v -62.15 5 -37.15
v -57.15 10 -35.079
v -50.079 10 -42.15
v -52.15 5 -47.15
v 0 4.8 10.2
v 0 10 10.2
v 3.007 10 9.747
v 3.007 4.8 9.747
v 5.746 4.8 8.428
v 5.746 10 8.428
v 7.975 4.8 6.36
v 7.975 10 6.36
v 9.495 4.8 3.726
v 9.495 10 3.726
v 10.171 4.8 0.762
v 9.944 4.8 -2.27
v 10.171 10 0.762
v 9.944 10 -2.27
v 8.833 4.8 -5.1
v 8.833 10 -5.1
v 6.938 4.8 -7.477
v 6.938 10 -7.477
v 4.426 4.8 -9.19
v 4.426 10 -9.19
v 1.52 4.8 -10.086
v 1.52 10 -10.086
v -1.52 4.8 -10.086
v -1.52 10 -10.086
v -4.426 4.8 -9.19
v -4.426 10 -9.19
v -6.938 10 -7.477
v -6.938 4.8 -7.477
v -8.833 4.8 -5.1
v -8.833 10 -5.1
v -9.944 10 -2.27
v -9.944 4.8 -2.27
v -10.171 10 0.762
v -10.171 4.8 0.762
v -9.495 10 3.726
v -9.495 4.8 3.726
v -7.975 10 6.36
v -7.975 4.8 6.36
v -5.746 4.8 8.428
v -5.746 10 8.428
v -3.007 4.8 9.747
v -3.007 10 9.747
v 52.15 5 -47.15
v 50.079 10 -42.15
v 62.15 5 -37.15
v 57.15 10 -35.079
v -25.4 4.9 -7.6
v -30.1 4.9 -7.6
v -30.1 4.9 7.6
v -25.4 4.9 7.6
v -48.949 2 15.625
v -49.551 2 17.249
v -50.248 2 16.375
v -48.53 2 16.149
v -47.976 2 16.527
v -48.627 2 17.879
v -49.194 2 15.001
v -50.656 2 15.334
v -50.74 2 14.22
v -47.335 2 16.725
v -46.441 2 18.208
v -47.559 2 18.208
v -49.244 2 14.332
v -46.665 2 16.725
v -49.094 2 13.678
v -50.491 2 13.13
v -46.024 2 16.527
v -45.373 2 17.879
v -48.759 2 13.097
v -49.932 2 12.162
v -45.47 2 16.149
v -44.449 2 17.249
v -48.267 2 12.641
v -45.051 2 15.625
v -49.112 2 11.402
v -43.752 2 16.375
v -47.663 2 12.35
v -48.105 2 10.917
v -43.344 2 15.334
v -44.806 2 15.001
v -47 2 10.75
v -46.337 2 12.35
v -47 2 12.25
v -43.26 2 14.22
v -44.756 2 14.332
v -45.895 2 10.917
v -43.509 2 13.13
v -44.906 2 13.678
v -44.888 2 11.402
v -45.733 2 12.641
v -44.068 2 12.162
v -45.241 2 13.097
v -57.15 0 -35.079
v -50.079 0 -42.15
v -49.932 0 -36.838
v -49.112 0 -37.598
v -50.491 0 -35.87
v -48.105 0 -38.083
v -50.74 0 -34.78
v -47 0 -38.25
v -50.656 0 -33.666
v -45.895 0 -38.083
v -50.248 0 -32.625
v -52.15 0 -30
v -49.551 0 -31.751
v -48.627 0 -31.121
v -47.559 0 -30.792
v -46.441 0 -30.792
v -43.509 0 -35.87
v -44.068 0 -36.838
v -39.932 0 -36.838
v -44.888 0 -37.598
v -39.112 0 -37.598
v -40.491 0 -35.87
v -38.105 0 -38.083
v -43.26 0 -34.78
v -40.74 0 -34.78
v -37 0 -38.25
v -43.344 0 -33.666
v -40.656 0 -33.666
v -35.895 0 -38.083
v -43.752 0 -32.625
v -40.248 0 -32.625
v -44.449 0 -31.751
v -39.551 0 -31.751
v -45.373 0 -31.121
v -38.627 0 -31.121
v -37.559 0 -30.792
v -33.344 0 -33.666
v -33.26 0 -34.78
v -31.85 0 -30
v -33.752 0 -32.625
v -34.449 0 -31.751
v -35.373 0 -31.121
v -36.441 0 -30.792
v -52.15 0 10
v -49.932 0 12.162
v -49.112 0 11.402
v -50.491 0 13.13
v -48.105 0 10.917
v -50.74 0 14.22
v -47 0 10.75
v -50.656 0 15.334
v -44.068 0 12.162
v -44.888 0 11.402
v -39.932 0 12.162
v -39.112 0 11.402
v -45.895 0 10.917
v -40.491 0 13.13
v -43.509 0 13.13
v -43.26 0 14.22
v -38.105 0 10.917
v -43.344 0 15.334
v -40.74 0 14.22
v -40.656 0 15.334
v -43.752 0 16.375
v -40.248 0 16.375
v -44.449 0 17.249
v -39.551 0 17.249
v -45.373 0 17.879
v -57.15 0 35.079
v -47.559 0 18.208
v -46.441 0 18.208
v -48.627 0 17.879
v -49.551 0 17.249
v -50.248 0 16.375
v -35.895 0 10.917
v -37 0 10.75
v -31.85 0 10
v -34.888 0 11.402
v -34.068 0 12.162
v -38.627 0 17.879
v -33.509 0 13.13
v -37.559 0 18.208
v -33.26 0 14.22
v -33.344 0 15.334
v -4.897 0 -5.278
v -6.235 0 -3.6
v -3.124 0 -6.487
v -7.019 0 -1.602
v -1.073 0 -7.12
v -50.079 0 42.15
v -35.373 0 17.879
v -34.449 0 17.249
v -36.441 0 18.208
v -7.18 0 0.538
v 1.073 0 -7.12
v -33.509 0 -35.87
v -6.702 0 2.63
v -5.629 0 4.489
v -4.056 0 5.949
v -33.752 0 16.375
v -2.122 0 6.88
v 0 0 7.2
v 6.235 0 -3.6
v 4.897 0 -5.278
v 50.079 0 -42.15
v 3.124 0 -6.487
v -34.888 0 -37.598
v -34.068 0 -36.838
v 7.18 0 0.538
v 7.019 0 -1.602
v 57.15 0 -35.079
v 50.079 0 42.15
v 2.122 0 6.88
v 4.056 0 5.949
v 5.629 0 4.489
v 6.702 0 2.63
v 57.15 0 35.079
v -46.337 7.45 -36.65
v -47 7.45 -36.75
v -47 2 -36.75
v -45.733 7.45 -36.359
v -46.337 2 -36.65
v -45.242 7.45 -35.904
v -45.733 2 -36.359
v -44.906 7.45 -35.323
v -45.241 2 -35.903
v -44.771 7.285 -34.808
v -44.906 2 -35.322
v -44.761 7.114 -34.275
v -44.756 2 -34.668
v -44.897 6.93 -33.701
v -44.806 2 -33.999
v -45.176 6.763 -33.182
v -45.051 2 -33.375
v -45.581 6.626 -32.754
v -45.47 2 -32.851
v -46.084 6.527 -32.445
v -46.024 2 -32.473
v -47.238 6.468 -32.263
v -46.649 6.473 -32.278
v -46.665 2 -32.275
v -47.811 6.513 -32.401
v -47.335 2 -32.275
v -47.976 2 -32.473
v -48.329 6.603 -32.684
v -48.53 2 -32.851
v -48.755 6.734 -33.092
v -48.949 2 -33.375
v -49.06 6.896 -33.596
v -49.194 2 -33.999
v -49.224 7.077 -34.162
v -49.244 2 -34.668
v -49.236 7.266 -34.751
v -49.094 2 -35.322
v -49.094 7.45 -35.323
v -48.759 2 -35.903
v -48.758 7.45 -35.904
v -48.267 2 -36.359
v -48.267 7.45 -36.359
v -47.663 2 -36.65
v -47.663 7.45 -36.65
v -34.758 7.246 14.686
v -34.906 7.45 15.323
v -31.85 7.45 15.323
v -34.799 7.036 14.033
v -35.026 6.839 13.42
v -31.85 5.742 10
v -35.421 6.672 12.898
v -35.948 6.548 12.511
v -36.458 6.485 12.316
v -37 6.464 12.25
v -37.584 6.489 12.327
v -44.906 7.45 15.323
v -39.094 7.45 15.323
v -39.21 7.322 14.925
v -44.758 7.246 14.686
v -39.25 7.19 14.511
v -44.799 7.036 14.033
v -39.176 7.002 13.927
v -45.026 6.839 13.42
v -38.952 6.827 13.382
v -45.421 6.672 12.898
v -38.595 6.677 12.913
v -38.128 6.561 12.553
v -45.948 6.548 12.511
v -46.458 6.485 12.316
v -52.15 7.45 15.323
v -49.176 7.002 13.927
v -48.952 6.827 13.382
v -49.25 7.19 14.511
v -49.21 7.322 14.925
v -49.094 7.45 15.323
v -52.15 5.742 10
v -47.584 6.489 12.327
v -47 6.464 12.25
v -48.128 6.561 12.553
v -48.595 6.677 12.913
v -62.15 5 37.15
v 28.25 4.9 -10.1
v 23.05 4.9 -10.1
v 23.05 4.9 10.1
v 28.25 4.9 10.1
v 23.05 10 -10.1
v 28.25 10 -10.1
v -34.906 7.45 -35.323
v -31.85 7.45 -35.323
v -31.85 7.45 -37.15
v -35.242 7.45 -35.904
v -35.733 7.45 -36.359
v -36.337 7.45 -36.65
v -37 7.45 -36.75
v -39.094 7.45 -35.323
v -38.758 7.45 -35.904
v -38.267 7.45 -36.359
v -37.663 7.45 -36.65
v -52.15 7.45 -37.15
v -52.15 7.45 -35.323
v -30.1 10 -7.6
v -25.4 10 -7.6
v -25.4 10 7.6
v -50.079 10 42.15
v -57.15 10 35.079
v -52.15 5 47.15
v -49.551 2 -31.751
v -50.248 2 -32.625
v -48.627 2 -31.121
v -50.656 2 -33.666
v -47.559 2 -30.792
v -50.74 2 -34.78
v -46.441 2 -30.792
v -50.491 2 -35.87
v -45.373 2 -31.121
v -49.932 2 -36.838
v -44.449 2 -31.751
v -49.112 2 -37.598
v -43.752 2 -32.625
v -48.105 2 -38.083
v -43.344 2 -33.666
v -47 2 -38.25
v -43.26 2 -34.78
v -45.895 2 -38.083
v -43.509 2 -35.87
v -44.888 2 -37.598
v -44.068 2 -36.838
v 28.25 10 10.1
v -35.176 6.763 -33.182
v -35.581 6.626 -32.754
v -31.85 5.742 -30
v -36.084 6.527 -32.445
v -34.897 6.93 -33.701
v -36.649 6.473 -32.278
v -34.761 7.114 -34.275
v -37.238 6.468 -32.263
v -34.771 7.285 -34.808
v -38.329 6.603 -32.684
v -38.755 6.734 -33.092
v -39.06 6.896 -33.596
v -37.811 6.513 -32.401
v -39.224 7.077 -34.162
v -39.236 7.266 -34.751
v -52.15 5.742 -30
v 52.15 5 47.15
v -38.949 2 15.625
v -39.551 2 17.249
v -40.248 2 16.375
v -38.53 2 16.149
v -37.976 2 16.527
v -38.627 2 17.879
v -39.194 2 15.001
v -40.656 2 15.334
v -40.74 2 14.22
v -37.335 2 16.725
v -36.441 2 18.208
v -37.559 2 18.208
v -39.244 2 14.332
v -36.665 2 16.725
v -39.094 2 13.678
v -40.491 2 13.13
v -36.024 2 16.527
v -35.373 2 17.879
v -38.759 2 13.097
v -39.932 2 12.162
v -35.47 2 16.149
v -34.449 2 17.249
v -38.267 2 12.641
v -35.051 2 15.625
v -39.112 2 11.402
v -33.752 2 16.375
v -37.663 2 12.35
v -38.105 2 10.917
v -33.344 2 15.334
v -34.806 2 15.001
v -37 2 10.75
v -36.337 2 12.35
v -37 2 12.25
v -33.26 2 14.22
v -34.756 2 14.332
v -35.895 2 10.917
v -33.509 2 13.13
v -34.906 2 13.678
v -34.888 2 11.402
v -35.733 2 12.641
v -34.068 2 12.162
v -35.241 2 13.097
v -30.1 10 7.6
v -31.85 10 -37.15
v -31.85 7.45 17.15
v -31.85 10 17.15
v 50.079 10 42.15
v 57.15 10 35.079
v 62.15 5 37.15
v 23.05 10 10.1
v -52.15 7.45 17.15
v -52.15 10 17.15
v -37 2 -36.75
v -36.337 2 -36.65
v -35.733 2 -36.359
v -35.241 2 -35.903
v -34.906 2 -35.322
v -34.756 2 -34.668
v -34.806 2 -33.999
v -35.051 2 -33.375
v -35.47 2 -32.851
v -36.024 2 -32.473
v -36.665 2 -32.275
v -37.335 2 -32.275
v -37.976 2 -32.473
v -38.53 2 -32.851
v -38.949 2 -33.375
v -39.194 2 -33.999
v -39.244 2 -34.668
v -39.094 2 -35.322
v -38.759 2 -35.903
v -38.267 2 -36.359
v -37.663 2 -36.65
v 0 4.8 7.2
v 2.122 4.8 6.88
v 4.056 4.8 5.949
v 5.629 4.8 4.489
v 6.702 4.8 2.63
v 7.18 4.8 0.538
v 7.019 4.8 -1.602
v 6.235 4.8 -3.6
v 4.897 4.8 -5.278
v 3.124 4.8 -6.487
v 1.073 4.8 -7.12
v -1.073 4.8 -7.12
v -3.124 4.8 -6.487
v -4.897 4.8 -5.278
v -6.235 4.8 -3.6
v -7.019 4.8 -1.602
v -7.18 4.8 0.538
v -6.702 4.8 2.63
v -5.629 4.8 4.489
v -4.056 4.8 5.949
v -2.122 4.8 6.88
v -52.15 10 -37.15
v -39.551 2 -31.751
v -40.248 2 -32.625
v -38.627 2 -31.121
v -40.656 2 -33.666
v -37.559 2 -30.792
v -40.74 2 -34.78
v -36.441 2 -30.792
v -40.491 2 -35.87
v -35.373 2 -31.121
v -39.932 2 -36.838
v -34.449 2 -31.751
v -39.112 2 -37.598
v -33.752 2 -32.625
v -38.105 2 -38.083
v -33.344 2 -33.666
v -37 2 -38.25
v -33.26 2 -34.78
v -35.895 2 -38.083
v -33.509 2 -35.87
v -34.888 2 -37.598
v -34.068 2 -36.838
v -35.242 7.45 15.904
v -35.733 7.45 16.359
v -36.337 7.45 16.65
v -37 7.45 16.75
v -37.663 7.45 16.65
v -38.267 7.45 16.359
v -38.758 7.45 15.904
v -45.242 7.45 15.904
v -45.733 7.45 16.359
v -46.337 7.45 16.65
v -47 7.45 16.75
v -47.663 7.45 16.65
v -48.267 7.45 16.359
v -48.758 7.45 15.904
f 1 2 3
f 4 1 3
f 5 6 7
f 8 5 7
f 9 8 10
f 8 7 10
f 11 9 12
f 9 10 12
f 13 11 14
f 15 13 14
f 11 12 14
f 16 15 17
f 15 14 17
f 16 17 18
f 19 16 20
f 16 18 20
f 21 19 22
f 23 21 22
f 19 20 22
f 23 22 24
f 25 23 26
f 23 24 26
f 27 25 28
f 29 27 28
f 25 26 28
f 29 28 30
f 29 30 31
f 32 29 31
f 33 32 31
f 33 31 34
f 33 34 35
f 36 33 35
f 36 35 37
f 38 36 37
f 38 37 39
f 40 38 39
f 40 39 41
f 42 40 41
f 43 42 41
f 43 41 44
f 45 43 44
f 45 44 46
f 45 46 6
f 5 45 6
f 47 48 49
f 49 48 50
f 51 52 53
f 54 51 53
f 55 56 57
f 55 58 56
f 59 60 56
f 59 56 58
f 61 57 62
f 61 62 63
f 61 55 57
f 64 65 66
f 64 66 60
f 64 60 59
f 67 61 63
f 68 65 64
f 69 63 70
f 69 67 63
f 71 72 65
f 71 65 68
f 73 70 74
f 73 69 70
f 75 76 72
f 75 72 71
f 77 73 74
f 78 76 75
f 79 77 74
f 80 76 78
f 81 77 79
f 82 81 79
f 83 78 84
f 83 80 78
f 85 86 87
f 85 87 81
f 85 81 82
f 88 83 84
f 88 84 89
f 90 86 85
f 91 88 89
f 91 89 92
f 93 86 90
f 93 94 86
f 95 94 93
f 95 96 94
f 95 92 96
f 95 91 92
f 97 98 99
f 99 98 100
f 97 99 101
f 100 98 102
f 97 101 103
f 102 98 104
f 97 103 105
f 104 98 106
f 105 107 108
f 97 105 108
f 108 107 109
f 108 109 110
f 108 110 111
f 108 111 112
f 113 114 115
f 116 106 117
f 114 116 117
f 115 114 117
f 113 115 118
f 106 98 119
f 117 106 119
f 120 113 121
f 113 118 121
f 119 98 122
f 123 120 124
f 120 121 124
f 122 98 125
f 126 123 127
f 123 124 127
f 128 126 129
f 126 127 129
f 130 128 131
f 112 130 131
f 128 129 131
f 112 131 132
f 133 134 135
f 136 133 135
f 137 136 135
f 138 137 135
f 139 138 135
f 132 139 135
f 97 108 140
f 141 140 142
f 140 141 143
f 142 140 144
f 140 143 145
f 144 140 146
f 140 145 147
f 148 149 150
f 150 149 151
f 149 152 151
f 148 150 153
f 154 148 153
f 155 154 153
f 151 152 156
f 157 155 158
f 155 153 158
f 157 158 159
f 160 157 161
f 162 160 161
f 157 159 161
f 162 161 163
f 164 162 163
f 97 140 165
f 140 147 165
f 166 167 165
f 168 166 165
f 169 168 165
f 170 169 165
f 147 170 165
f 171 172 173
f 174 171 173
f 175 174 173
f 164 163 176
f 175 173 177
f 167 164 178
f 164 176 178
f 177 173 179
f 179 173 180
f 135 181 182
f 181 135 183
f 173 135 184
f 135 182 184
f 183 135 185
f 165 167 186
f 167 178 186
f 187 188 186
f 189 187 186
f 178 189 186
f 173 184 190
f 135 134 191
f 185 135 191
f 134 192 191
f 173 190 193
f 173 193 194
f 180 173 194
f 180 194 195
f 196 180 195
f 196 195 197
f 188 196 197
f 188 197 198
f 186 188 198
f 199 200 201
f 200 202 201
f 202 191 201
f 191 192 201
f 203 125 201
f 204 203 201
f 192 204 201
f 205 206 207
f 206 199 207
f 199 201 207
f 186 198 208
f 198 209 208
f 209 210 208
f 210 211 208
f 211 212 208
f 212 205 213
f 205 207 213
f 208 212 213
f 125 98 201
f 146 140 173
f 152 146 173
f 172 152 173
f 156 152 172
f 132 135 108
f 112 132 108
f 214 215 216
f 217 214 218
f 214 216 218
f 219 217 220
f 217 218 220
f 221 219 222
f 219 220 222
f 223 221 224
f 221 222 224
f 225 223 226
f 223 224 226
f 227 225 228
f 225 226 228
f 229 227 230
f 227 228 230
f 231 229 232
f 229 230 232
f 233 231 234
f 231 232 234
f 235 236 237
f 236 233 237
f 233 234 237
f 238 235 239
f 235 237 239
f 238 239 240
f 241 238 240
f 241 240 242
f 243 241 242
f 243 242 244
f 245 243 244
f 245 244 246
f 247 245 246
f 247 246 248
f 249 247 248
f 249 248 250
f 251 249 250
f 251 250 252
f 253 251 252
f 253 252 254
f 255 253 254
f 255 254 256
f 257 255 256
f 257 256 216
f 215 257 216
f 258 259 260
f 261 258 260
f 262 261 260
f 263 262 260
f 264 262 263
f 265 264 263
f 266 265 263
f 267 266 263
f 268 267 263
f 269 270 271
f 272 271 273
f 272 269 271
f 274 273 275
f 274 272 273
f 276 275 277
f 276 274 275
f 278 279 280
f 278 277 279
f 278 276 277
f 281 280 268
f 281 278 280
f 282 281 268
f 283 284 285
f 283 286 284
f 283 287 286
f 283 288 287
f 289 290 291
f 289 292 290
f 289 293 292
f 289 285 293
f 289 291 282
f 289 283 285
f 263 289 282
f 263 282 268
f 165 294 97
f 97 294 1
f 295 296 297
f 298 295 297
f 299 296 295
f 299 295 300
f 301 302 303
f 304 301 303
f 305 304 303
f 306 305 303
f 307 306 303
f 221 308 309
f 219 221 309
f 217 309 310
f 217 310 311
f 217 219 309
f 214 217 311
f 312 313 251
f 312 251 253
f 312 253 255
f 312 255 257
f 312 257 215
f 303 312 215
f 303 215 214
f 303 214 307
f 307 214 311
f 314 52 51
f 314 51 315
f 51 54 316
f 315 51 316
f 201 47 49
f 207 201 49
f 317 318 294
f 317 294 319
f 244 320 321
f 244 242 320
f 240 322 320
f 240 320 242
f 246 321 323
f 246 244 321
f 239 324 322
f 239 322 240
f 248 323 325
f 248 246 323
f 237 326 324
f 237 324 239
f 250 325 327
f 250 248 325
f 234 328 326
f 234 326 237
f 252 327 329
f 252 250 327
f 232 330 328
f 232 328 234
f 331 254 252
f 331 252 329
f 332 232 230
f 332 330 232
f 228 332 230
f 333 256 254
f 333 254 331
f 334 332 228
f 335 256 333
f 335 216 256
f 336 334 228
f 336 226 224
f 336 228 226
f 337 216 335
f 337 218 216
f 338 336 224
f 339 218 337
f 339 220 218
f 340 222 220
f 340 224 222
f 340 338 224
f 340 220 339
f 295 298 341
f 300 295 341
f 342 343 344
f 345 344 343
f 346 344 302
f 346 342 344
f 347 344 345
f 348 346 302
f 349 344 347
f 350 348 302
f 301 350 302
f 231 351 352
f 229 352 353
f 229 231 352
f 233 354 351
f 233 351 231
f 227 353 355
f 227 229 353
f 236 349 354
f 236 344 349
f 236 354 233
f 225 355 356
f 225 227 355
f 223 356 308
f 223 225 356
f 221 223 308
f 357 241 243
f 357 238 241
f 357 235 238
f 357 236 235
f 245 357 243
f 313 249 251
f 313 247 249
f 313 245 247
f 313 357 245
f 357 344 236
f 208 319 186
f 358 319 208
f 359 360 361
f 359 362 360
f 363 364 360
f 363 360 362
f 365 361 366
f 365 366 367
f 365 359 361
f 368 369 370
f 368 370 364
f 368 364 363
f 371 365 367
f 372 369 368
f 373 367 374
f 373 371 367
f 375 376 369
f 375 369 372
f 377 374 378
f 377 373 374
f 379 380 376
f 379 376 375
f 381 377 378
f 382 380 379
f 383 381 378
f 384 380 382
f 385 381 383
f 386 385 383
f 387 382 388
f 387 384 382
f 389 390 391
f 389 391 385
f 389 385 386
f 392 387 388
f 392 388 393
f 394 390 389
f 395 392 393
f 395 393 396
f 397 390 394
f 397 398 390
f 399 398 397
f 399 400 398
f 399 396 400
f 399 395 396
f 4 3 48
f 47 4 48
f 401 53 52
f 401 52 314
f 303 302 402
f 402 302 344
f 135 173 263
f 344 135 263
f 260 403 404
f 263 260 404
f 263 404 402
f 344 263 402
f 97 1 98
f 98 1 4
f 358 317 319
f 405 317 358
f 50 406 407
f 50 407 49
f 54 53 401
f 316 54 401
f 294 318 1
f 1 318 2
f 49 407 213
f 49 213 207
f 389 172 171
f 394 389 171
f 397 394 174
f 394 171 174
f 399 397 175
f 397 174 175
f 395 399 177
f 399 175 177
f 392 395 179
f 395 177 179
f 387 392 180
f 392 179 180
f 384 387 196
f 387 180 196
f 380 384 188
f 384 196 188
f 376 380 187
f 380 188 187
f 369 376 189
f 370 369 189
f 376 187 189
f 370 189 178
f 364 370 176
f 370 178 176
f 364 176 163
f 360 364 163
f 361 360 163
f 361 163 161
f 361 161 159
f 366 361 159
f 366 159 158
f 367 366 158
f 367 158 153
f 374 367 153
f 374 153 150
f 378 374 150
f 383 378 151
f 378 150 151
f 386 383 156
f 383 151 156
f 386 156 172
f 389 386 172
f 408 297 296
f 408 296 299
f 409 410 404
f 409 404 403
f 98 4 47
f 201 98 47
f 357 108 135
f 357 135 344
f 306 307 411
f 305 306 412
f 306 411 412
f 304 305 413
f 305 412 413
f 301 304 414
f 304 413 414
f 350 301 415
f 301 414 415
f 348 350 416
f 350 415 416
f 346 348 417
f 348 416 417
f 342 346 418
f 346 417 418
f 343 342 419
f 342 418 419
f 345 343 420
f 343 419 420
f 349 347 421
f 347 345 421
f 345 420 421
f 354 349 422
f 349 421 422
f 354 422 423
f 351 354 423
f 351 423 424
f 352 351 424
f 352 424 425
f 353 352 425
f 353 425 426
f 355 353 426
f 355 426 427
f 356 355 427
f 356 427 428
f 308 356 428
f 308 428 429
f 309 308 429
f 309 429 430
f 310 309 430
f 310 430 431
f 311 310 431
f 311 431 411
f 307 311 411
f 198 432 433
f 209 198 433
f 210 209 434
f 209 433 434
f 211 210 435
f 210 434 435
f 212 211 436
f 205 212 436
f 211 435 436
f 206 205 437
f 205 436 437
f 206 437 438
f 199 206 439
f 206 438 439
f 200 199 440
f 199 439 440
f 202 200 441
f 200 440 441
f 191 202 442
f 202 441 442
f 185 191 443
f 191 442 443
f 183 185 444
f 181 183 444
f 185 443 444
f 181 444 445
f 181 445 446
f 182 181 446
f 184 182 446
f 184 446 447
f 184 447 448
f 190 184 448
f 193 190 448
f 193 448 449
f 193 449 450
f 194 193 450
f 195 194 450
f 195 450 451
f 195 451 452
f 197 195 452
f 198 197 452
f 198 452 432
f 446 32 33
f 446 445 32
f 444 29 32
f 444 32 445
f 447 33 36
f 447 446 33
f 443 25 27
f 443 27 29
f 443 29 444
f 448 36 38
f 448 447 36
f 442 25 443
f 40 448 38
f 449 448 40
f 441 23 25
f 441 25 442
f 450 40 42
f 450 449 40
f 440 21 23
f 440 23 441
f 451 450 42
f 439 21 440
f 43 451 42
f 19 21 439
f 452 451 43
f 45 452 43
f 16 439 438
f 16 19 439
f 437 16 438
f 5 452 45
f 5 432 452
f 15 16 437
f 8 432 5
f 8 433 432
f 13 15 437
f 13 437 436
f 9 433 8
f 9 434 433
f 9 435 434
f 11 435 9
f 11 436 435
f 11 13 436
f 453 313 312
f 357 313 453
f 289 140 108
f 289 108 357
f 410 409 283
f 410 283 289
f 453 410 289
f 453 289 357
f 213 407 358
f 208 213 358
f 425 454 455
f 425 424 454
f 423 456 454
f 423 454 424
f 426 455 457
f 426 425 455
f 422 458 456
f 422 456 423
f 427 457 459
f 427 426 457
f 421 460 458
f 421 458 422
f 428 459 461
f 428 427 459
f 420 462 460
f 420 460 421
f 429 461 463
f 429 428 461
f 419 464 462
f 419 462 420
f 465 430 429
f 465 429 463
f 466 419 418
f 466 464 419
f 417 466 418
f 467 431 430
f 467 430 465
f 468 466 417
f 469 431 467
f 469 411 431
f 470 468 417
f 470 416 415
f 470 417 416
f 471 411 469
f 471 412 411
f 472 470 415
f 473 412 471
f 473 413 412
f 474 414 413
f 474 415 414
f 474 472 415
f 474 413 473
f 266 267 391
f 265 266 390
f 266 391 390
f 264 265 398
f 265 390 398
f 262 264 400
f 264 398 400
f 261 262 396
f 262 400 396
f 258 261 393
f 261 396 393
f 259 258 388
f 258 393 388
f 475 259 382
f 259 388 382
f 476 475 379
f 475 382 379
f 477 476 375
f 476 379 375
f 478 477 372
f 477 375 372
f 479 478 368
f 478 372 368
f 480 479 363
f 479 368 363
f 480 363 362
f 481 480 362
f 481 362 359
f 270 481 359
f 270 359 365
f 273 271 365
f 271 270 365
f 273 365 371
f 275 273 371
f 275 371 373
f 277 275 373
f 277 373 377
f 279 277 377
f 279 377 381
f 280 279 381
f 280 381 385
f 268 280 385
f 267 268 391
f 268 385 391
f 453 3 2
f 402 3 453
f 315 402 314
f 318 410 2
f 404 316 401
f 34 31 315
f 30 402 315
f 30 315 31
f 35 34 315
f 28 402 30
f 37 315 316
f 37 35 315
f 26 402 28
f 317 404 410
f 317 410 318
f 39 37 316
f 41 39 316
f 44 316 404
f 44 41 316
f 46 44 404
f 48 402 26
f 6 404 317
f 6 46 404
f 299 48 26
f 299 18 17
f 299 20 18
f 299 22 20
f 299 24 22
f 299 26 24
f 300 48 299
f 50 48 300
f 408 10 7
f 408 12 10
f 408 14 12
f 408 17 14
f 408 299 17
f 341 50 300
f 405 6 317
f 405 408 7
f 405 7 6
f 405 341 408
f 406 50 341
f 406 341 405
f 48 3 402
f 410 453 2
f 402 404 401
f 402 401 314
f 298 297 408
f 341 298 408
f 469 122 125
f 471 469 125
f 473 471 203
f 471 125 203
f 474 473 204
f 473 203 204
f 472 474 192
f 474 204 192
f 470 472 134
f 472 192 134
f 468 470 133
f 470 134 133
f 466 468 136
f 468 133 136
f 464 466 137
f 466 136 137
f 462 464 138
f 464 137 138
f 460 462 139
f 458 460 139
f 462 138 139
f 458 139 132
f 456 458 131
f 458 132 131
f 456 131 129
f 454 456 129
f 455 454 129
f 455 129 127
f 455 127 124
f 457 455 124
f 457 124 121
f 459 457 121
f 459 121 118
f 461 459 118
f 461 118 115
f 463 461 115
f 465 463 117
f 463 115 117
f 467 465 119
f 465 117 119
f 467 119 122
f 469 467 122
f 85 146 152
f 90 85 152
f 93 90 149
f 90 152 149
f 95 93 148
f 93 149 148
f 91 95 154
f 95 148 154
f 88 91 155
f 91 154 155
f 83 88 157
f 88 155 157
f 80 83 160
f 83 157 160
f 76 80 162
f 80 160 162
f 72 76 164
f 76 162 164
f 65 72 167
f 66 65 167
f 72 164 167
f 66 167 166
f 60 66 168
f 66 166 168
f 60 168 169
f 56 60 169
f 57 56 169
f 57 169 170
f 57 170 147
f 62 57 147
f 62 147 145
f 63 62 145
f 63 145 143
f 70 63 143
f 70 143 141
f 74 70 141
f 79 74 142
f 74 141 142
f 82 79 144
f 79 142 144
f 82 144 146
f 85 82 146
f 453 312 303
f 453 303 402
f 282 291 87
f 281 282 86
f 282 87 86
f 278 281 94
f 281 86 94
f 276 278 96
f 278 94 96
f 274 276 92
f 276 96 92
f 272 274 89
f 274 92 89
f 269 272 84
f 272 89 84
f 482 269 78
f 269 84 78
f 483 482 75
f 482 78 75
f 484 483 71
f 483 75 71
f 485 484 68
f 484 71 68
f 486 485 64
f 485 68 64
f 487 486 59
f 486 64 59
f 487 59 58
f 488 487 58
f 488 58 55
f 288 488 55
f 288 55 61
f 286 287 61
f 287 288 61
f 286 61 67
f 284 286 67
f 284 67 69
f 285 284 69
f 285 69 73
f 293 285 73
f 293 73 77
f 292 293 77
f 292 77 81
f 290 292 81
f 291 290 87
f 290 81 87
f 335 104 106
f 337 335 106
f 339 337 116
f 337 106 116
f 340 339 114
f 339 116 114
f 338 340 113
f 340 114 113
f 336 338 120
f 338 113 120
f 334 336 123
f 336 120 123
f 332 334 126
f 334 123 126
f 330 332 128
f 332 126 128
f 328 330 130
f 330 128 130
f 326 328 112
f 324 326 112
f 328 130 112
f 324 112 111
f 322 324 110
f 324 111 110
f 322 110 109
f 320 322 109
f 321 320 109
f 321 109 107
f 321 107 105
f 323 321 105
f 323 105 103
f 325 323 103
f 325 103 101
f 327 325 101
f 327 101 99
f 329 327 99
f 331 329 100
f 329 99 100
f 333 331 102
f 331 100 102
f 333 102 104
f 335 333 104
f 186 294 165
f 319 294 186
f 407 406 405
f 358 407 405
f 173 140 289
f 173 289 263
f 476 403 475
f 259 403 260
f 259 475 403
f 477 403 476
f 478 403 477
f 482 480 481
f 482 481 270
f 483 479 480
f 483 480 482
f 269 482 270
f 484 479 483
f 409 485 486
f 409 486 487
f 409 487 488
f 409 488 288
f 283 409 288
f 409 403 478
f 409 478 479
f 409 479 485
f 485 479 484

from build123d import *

# Parameters (mm, degrees)
BASE_R                                     = 100
BASE_CIRCLE_DEPTH                          = 10
VERT_START                                 = 5
CUTOUT_W                                   = 4.6
CUTOUT_H                                   = 20
CUTOUT_W_2                                 = 0.4
CUTOUT_W_3                                 = 4.5
CUTOUT_H_2                                 = 15
VERT_SUPPORT_DEPTH                         = 137.774468788
F_1_START                                  = 23.05
F_1_OFFSET_FOR_VERT_SUPPORT_OUTLINE_W      = 5.1
F_1_OFFSET_FOR_VERT_SUPPORT_OUTLINE_H      = 20.2
F_1_OFFSET_FOR_VERT_SUPPORT_DEPTH          = 5.2
F_1_START_2                                = -30.1
F_1_OFFSET_FOR_VERT_SUPPORT_2_OUTLINE_W    = 5.1
F_1_OFFSET_FOR_VERT_SUPPORT_2_OUTLINE_H    = 15.2
F_1_OFFSET_FOR_VERT_SUPPORT_2_DEPTH        = 4.7
CUTOUT_3_W                                 = 20
CUTOUT_3_H                                 = 40
SERVO_CUTOUT_DEPTH                         = 142.774468788
SKETCH4_W                                  = 20
SKETCH4_H                                  = 54
SERVO_REST_DEPTH                           = 2.4
SERVO_SLANT_1_SIZE                         = 5.3
SERVO_SLANT_1_SIZE2                        = 1.7
SERVO_SLANT_2_SIZE                         = 1.7
SERVO_SLANT_2_SIZE2                        = 5.3
F_15_START                                 = -52.15
F_15_SERVO_PRINT_OFFSET_DEPTH              = 20.3
SKETCH6_R                                  = 2.25
M4_THREAD_CLEARANCE_WIGGLE_ROOM_DEPTH      = 142.774468788
SKETCH6_3_R                                = 3.75
M4_SOCKET_HEAD_CLEARANCE_WIGGLE_ROOM_DEPTH = 2
SKETCH5_R                                  = 10
SKETCH5_R_2                                = 7
CENTRAL_AXLE_HEAD_CUTOUT_DEPTH             = 5
SKETCH5_3_R                                = 7
AXLE_BODY_CUTOUT_DEPTH                     = 142.774468788
F_15_OFFSET_AXLE_BY                        = 0.2
F_15_OFFSET_AXLE_2_BY                      = 0.2
F_15_OFFSET_AXLE_3_BY                      = 0.2
SKETCH8_W                                  = 124.3
SKETCH8_H                                  = 94.3
INTERSECT_TOOL_DEPTH                       = 10
CORNER_CHAMFER_SIZE                        = 10
EDGE_CHAMFER_SIZE                          = 5


# Read off the part's stored shape, not the designer's step: .1 Offset for vert support, .15 Servo Print Offset
with BuildPart() as part:
    # Base → Base Circle (new body)
    with BuildSketch(Plane(origin=(0, 0, 0), x_dir=(1, 0, 0), z_dir=(0, 1, 0))):
        with Locations(Location((0, 0, 0), (0, 0, 270))):
            Circle(BASE_R)
    extrude(amount=BASE_CIRCLE_DEPTH)

    # Cutout → Vert Support (cut, through all)
    with BuildSketch(Plane(origin=(0, 0, 0), x_dir=(1, 0, 0), z_dir=(0, 1, 0)).offset(VERT_START)):
        with Locations((25.45, 0)):
            Rectangle(CUTOUT_W, CUTOUT_H)
        with Locations((27.95, 0)):
            Rectangle(CUTOUT_W_2, CUTOUT_H)
        with Locations((-27.75, 0)):
            Rectangle(CUTOUT_W_3, CUTOUT_H_2)
    extrude(amount=VERT_SUPPORT_DEPTH, mode=Mode.SUBTRACT)

    # .1 Offset for vert support outline → .1 Offset for vert support (cut)
    with BuildSketch(Plane.YZ.offset(F_1_START)):
        with Locations((7.45, 0)):
            Rectangle(F_1_OFFSET_FOR_VERT_SUPPORT_OUTLINE_W, F_1_OFFSET_FOR_VERT_SUPPORT_OUTLINE_H)
    extrude(amount=F_1_OFFSET_FOR_VERT_SUPPORT_DEPTH, mode=Mode.SUBTRACT)

    # 1 Offset for vert support 2 outline → 1 Offset for vert support 2 (cut)
    with BuildSketch(Plane.YZ.offset(F_1_START_2)):
        with Locations((7.45, 0)):
            Rectangle(F_1_OFFSET_FOR_VERT_SUPPORT_2_OUTLINE_W, F_1_OFFSET_FOR_VERT_SUPPORT_2_OUTLINE_H)
    extrude(amount=F_1_OFFSET_FOR_VERT_SUPPORT_2_DEPTH, mode=Mode.SUBTRACT)

    # Cutout<3> → Servo cutout (cut, through all)
    with BuildSketch(Plane(origin=(0, 0, 0), x_dir=(1, 0, 0), z_dir=(0, 1, 0))):
        with Locations((-42, 10)):
            Rectangle(CUTOUT_3_W, CUTOUT_3_H)
    extrude(amount=SERVO_CUTOUT_DEPTH, mode=Mode.SUBTRACT)

    # Sketch4 → Servo rest (cut)
    with BuildSketch(Plane.XZ.offset(-10)):
        with Locations((-42, -10)):
            Rectangle(SKETCH4_W, SKETCH4_H)
    extrude(amount=SERVO_REST_DEPTH, mode=Mode.SUBTRACT)

    # Servo Slant 1
    servo_slant_1_edges = [part.edges().sort_by_distance(p)[0] for p in [
        (-42, 7.6, -30),
    ]]
    servo_slant_1_side = [part.faces().sort_by_distance(p)[0] for p in [
        (-42, 7.6, -33.5),
    ]]
    chamfer(servo_slant_1_edges, length=SERVO_SLANT_1_SIZE, length2=SERVO_SLANT_1_SIZE2, reference=servo_slant_1_side[0])

    # Servo Slant 2
    servo_slant_2_edges = [part.edges().sort_by_distance(p)[0] for p in [
        (-42, 7.6, 10),
    ]]
    servo_slant_2_side = [part.faces().sort_by_distance(p)[0] for p in [
        (-42, 3.8, 10),
    ]]
    chamfer(servo_slant_2_edges, length=SERVO_SLANT_2_SIZE, length2=SERVO_SLANT_2_SIZE2, reference=servo_slant_2_side[0])

    # .15 Servo Print Offset outline → .15 Servo Print Offset (cut)
    with BuildSketch(Plane.YZ.offset(F_15_START)):
        Polygon((10, 17.15), (7.45, 17.15), (7.45, 15.323467766), (5.742472603, 10), (0, 10), (0, -30), (5.742472603, -30), (7.45, -35.323467766), (7.45, -37.15), (10, -37.15), align=None)
    extrude(amount=F_15_SERVO_PRINT_OFFSET_DEPTH, mode=Mode.SUBTRACT)

    # Sketch6 → M4 Thread Clearance + wiggle room (cut, through all)
    with BuildSketch(Plane.XZ):
        with Locations(Location((-47, -34.5, 0), (0, 0, 270))):
            Circle(SKETCH6_R)
        with Locations(Location((-37, -34.5, 0), (0, 0, 270))):
            Circle(SKETCH6_R)
        with Locations(Location((-37, 14.5, 0), (0, 0, 270))):
            Circle(SKETCH6_R)
        with Locations(Location((-47, 14.5, 0), (0, 0, 270))):
            Circle(SKETCH6_R)
    extrude(amount=-M4_THREAD_CLEARANCE_WIGGLE_ROOM_DEPTH, mode=Mode.SUBTRACT)

    # Sketch6<3> → M4 Socket Head Clearance + wiggle room (cut)
    with BuildSketch(Plane.XZ):
        with Locations(Location((-47, -34.5, 0), (0, 0, 270))):
            Circle(SKETCH6_3_R)
        with Locations(Location((-37, -34.5, 0), (0, 0, 270))):
            Circle(SKETCH6_3_R)
        with Locations(Location((-37, 14.5, 0), (0, 0, 270))):
            Circle(SKETCH6_3_R)
        with Locations(Location((-47, 14.5, 0), (0, 0, 270))):
            Circle(SKETCH6_3_R)
    extrude(amount=-M4_SOCKET_HEAD_CLEARANCE_WIGGLE_ROOM_DEPTH, mode=Mode.SUBTRACT)

    # Sketch5 → Central Axle Head cutout (cut)
    with BuildSketch(Plane(origin=(0, 10, 0), x_dir=(1, 0, 0), z_dir=(0, 1, 0))):
        with Locations(Location((0, 0, 0), (0, 0, 270))):
            Circle(SKETCH5_R)
        with Locations(Location((0, 0, 0), (0, 0, 270))):
            Circle(SKETCH5_R_2, mode=Mode.SUBTRACT)
    extrude(amount=-CENTRAL_AXLE_HEAD_CUTOUT_DEPTH, mode=Mode.SUBTRACT)

    # Sketch5<3> → Axle Body cutout (cut, through all)
    with BuildSketch(Plane(origin=(0, 10, 0), x_dir=(1, 0, 0), z_dir=(0, 1, 0))):
        with Locations(Location((0, 0, 0), (0, 0, 270))):
            Circle(SKETCH5_3_R)
    extrude(amount=-AXLE_BODY_CUTOUT_DEPTH, mode=Mode.SUBTRACT)

    # .15 Offset, Axle: a face moved inward by 0.2
    extrude(part.faces().sort_by_distance((0, 5, 8))[0], amount=F_15_OFFSET_AXLE_BY, dir=(0, -1, 0), mode=Mode.SUBTRACT)

    # 15 Offset_ Axle 2: a curved face moved inward by 0.2
    add(Solid.thicken(part.faces().sort_by_distance((0, 2.5, -7))[0], -F_15_OFFSET_AXLE_2_BY), mode=Mode.SUBTRACT)

    # 15 Offset_ Axle 3: a curved face moved inward by 0.2
    add(Solid.thicken(part.faces().sort_by_distance((0, 7.5, -10))[0], -F_15_OFFSET_AXLE_3_BY), mode=Mode.SUBTRACT)


with BuildPart() as body_2:
    # Sketch8 → Intersect Tool (new body)
    with BuildSketch(Plane(origin=(0, 10, 0), x_dir=(1, 0, 0), z_dir=(0, 1, 0))):
        Rectangle(SKETCH8_W, SKETCH8_H)
    extrude(amount=-INTERSECT_TOOL_DEPTH)


with BuildPart() as part_1:
    add(part.part)

    # Intersect with tool: intersect body 2
    add(body_2.part, mode=Mode.INTERSECT)

    # Corner Chamfer
    corner_chamfer_edges = [part_1.edges().sort_by_distance(p)[0] for p in [
        (62.15, 5, -47.15),
        (62.15, 5, 47.15),
        (-62.15, 5, 47.15),
        (-62.15, 5, -47.15),
    ]]
    chamfer(corner_chamfer_edges, length=CORNER_CHAMFER_SIZE)

    # Edge Chamfer
    edge_chamfer_edges = [part_1.edges().sort_by_distance(p)[0] for p in [
        (-57.15, 10, -42.15),
        (0, 10, -47.15),
        (57.15, 10, -42.15),
        (62.15, 10, 0),
        (57.15, 10, 42.15),
        (0, 10, 47.15),
        (-57.15, 10, 42.15),
        (-62.15, 10, 0),
        (-57.15, 0, -42.15),
        (0, 0, -47.15),
        (57.15, 0, -42.15),
        (62.15, 0, 0),
        (57.15, 0, 42.15),
        (-62.15, 0, 0),
        (-57.15, 0, 42.15),
        (0, 0, 47.15),
    ]]
    chamfer(edge_chamfer_edges, length=EDGE_CHAMFER_SIZE - 0.0001)  # a hair under: the kernel refuses the full size


solid = part_1.part
